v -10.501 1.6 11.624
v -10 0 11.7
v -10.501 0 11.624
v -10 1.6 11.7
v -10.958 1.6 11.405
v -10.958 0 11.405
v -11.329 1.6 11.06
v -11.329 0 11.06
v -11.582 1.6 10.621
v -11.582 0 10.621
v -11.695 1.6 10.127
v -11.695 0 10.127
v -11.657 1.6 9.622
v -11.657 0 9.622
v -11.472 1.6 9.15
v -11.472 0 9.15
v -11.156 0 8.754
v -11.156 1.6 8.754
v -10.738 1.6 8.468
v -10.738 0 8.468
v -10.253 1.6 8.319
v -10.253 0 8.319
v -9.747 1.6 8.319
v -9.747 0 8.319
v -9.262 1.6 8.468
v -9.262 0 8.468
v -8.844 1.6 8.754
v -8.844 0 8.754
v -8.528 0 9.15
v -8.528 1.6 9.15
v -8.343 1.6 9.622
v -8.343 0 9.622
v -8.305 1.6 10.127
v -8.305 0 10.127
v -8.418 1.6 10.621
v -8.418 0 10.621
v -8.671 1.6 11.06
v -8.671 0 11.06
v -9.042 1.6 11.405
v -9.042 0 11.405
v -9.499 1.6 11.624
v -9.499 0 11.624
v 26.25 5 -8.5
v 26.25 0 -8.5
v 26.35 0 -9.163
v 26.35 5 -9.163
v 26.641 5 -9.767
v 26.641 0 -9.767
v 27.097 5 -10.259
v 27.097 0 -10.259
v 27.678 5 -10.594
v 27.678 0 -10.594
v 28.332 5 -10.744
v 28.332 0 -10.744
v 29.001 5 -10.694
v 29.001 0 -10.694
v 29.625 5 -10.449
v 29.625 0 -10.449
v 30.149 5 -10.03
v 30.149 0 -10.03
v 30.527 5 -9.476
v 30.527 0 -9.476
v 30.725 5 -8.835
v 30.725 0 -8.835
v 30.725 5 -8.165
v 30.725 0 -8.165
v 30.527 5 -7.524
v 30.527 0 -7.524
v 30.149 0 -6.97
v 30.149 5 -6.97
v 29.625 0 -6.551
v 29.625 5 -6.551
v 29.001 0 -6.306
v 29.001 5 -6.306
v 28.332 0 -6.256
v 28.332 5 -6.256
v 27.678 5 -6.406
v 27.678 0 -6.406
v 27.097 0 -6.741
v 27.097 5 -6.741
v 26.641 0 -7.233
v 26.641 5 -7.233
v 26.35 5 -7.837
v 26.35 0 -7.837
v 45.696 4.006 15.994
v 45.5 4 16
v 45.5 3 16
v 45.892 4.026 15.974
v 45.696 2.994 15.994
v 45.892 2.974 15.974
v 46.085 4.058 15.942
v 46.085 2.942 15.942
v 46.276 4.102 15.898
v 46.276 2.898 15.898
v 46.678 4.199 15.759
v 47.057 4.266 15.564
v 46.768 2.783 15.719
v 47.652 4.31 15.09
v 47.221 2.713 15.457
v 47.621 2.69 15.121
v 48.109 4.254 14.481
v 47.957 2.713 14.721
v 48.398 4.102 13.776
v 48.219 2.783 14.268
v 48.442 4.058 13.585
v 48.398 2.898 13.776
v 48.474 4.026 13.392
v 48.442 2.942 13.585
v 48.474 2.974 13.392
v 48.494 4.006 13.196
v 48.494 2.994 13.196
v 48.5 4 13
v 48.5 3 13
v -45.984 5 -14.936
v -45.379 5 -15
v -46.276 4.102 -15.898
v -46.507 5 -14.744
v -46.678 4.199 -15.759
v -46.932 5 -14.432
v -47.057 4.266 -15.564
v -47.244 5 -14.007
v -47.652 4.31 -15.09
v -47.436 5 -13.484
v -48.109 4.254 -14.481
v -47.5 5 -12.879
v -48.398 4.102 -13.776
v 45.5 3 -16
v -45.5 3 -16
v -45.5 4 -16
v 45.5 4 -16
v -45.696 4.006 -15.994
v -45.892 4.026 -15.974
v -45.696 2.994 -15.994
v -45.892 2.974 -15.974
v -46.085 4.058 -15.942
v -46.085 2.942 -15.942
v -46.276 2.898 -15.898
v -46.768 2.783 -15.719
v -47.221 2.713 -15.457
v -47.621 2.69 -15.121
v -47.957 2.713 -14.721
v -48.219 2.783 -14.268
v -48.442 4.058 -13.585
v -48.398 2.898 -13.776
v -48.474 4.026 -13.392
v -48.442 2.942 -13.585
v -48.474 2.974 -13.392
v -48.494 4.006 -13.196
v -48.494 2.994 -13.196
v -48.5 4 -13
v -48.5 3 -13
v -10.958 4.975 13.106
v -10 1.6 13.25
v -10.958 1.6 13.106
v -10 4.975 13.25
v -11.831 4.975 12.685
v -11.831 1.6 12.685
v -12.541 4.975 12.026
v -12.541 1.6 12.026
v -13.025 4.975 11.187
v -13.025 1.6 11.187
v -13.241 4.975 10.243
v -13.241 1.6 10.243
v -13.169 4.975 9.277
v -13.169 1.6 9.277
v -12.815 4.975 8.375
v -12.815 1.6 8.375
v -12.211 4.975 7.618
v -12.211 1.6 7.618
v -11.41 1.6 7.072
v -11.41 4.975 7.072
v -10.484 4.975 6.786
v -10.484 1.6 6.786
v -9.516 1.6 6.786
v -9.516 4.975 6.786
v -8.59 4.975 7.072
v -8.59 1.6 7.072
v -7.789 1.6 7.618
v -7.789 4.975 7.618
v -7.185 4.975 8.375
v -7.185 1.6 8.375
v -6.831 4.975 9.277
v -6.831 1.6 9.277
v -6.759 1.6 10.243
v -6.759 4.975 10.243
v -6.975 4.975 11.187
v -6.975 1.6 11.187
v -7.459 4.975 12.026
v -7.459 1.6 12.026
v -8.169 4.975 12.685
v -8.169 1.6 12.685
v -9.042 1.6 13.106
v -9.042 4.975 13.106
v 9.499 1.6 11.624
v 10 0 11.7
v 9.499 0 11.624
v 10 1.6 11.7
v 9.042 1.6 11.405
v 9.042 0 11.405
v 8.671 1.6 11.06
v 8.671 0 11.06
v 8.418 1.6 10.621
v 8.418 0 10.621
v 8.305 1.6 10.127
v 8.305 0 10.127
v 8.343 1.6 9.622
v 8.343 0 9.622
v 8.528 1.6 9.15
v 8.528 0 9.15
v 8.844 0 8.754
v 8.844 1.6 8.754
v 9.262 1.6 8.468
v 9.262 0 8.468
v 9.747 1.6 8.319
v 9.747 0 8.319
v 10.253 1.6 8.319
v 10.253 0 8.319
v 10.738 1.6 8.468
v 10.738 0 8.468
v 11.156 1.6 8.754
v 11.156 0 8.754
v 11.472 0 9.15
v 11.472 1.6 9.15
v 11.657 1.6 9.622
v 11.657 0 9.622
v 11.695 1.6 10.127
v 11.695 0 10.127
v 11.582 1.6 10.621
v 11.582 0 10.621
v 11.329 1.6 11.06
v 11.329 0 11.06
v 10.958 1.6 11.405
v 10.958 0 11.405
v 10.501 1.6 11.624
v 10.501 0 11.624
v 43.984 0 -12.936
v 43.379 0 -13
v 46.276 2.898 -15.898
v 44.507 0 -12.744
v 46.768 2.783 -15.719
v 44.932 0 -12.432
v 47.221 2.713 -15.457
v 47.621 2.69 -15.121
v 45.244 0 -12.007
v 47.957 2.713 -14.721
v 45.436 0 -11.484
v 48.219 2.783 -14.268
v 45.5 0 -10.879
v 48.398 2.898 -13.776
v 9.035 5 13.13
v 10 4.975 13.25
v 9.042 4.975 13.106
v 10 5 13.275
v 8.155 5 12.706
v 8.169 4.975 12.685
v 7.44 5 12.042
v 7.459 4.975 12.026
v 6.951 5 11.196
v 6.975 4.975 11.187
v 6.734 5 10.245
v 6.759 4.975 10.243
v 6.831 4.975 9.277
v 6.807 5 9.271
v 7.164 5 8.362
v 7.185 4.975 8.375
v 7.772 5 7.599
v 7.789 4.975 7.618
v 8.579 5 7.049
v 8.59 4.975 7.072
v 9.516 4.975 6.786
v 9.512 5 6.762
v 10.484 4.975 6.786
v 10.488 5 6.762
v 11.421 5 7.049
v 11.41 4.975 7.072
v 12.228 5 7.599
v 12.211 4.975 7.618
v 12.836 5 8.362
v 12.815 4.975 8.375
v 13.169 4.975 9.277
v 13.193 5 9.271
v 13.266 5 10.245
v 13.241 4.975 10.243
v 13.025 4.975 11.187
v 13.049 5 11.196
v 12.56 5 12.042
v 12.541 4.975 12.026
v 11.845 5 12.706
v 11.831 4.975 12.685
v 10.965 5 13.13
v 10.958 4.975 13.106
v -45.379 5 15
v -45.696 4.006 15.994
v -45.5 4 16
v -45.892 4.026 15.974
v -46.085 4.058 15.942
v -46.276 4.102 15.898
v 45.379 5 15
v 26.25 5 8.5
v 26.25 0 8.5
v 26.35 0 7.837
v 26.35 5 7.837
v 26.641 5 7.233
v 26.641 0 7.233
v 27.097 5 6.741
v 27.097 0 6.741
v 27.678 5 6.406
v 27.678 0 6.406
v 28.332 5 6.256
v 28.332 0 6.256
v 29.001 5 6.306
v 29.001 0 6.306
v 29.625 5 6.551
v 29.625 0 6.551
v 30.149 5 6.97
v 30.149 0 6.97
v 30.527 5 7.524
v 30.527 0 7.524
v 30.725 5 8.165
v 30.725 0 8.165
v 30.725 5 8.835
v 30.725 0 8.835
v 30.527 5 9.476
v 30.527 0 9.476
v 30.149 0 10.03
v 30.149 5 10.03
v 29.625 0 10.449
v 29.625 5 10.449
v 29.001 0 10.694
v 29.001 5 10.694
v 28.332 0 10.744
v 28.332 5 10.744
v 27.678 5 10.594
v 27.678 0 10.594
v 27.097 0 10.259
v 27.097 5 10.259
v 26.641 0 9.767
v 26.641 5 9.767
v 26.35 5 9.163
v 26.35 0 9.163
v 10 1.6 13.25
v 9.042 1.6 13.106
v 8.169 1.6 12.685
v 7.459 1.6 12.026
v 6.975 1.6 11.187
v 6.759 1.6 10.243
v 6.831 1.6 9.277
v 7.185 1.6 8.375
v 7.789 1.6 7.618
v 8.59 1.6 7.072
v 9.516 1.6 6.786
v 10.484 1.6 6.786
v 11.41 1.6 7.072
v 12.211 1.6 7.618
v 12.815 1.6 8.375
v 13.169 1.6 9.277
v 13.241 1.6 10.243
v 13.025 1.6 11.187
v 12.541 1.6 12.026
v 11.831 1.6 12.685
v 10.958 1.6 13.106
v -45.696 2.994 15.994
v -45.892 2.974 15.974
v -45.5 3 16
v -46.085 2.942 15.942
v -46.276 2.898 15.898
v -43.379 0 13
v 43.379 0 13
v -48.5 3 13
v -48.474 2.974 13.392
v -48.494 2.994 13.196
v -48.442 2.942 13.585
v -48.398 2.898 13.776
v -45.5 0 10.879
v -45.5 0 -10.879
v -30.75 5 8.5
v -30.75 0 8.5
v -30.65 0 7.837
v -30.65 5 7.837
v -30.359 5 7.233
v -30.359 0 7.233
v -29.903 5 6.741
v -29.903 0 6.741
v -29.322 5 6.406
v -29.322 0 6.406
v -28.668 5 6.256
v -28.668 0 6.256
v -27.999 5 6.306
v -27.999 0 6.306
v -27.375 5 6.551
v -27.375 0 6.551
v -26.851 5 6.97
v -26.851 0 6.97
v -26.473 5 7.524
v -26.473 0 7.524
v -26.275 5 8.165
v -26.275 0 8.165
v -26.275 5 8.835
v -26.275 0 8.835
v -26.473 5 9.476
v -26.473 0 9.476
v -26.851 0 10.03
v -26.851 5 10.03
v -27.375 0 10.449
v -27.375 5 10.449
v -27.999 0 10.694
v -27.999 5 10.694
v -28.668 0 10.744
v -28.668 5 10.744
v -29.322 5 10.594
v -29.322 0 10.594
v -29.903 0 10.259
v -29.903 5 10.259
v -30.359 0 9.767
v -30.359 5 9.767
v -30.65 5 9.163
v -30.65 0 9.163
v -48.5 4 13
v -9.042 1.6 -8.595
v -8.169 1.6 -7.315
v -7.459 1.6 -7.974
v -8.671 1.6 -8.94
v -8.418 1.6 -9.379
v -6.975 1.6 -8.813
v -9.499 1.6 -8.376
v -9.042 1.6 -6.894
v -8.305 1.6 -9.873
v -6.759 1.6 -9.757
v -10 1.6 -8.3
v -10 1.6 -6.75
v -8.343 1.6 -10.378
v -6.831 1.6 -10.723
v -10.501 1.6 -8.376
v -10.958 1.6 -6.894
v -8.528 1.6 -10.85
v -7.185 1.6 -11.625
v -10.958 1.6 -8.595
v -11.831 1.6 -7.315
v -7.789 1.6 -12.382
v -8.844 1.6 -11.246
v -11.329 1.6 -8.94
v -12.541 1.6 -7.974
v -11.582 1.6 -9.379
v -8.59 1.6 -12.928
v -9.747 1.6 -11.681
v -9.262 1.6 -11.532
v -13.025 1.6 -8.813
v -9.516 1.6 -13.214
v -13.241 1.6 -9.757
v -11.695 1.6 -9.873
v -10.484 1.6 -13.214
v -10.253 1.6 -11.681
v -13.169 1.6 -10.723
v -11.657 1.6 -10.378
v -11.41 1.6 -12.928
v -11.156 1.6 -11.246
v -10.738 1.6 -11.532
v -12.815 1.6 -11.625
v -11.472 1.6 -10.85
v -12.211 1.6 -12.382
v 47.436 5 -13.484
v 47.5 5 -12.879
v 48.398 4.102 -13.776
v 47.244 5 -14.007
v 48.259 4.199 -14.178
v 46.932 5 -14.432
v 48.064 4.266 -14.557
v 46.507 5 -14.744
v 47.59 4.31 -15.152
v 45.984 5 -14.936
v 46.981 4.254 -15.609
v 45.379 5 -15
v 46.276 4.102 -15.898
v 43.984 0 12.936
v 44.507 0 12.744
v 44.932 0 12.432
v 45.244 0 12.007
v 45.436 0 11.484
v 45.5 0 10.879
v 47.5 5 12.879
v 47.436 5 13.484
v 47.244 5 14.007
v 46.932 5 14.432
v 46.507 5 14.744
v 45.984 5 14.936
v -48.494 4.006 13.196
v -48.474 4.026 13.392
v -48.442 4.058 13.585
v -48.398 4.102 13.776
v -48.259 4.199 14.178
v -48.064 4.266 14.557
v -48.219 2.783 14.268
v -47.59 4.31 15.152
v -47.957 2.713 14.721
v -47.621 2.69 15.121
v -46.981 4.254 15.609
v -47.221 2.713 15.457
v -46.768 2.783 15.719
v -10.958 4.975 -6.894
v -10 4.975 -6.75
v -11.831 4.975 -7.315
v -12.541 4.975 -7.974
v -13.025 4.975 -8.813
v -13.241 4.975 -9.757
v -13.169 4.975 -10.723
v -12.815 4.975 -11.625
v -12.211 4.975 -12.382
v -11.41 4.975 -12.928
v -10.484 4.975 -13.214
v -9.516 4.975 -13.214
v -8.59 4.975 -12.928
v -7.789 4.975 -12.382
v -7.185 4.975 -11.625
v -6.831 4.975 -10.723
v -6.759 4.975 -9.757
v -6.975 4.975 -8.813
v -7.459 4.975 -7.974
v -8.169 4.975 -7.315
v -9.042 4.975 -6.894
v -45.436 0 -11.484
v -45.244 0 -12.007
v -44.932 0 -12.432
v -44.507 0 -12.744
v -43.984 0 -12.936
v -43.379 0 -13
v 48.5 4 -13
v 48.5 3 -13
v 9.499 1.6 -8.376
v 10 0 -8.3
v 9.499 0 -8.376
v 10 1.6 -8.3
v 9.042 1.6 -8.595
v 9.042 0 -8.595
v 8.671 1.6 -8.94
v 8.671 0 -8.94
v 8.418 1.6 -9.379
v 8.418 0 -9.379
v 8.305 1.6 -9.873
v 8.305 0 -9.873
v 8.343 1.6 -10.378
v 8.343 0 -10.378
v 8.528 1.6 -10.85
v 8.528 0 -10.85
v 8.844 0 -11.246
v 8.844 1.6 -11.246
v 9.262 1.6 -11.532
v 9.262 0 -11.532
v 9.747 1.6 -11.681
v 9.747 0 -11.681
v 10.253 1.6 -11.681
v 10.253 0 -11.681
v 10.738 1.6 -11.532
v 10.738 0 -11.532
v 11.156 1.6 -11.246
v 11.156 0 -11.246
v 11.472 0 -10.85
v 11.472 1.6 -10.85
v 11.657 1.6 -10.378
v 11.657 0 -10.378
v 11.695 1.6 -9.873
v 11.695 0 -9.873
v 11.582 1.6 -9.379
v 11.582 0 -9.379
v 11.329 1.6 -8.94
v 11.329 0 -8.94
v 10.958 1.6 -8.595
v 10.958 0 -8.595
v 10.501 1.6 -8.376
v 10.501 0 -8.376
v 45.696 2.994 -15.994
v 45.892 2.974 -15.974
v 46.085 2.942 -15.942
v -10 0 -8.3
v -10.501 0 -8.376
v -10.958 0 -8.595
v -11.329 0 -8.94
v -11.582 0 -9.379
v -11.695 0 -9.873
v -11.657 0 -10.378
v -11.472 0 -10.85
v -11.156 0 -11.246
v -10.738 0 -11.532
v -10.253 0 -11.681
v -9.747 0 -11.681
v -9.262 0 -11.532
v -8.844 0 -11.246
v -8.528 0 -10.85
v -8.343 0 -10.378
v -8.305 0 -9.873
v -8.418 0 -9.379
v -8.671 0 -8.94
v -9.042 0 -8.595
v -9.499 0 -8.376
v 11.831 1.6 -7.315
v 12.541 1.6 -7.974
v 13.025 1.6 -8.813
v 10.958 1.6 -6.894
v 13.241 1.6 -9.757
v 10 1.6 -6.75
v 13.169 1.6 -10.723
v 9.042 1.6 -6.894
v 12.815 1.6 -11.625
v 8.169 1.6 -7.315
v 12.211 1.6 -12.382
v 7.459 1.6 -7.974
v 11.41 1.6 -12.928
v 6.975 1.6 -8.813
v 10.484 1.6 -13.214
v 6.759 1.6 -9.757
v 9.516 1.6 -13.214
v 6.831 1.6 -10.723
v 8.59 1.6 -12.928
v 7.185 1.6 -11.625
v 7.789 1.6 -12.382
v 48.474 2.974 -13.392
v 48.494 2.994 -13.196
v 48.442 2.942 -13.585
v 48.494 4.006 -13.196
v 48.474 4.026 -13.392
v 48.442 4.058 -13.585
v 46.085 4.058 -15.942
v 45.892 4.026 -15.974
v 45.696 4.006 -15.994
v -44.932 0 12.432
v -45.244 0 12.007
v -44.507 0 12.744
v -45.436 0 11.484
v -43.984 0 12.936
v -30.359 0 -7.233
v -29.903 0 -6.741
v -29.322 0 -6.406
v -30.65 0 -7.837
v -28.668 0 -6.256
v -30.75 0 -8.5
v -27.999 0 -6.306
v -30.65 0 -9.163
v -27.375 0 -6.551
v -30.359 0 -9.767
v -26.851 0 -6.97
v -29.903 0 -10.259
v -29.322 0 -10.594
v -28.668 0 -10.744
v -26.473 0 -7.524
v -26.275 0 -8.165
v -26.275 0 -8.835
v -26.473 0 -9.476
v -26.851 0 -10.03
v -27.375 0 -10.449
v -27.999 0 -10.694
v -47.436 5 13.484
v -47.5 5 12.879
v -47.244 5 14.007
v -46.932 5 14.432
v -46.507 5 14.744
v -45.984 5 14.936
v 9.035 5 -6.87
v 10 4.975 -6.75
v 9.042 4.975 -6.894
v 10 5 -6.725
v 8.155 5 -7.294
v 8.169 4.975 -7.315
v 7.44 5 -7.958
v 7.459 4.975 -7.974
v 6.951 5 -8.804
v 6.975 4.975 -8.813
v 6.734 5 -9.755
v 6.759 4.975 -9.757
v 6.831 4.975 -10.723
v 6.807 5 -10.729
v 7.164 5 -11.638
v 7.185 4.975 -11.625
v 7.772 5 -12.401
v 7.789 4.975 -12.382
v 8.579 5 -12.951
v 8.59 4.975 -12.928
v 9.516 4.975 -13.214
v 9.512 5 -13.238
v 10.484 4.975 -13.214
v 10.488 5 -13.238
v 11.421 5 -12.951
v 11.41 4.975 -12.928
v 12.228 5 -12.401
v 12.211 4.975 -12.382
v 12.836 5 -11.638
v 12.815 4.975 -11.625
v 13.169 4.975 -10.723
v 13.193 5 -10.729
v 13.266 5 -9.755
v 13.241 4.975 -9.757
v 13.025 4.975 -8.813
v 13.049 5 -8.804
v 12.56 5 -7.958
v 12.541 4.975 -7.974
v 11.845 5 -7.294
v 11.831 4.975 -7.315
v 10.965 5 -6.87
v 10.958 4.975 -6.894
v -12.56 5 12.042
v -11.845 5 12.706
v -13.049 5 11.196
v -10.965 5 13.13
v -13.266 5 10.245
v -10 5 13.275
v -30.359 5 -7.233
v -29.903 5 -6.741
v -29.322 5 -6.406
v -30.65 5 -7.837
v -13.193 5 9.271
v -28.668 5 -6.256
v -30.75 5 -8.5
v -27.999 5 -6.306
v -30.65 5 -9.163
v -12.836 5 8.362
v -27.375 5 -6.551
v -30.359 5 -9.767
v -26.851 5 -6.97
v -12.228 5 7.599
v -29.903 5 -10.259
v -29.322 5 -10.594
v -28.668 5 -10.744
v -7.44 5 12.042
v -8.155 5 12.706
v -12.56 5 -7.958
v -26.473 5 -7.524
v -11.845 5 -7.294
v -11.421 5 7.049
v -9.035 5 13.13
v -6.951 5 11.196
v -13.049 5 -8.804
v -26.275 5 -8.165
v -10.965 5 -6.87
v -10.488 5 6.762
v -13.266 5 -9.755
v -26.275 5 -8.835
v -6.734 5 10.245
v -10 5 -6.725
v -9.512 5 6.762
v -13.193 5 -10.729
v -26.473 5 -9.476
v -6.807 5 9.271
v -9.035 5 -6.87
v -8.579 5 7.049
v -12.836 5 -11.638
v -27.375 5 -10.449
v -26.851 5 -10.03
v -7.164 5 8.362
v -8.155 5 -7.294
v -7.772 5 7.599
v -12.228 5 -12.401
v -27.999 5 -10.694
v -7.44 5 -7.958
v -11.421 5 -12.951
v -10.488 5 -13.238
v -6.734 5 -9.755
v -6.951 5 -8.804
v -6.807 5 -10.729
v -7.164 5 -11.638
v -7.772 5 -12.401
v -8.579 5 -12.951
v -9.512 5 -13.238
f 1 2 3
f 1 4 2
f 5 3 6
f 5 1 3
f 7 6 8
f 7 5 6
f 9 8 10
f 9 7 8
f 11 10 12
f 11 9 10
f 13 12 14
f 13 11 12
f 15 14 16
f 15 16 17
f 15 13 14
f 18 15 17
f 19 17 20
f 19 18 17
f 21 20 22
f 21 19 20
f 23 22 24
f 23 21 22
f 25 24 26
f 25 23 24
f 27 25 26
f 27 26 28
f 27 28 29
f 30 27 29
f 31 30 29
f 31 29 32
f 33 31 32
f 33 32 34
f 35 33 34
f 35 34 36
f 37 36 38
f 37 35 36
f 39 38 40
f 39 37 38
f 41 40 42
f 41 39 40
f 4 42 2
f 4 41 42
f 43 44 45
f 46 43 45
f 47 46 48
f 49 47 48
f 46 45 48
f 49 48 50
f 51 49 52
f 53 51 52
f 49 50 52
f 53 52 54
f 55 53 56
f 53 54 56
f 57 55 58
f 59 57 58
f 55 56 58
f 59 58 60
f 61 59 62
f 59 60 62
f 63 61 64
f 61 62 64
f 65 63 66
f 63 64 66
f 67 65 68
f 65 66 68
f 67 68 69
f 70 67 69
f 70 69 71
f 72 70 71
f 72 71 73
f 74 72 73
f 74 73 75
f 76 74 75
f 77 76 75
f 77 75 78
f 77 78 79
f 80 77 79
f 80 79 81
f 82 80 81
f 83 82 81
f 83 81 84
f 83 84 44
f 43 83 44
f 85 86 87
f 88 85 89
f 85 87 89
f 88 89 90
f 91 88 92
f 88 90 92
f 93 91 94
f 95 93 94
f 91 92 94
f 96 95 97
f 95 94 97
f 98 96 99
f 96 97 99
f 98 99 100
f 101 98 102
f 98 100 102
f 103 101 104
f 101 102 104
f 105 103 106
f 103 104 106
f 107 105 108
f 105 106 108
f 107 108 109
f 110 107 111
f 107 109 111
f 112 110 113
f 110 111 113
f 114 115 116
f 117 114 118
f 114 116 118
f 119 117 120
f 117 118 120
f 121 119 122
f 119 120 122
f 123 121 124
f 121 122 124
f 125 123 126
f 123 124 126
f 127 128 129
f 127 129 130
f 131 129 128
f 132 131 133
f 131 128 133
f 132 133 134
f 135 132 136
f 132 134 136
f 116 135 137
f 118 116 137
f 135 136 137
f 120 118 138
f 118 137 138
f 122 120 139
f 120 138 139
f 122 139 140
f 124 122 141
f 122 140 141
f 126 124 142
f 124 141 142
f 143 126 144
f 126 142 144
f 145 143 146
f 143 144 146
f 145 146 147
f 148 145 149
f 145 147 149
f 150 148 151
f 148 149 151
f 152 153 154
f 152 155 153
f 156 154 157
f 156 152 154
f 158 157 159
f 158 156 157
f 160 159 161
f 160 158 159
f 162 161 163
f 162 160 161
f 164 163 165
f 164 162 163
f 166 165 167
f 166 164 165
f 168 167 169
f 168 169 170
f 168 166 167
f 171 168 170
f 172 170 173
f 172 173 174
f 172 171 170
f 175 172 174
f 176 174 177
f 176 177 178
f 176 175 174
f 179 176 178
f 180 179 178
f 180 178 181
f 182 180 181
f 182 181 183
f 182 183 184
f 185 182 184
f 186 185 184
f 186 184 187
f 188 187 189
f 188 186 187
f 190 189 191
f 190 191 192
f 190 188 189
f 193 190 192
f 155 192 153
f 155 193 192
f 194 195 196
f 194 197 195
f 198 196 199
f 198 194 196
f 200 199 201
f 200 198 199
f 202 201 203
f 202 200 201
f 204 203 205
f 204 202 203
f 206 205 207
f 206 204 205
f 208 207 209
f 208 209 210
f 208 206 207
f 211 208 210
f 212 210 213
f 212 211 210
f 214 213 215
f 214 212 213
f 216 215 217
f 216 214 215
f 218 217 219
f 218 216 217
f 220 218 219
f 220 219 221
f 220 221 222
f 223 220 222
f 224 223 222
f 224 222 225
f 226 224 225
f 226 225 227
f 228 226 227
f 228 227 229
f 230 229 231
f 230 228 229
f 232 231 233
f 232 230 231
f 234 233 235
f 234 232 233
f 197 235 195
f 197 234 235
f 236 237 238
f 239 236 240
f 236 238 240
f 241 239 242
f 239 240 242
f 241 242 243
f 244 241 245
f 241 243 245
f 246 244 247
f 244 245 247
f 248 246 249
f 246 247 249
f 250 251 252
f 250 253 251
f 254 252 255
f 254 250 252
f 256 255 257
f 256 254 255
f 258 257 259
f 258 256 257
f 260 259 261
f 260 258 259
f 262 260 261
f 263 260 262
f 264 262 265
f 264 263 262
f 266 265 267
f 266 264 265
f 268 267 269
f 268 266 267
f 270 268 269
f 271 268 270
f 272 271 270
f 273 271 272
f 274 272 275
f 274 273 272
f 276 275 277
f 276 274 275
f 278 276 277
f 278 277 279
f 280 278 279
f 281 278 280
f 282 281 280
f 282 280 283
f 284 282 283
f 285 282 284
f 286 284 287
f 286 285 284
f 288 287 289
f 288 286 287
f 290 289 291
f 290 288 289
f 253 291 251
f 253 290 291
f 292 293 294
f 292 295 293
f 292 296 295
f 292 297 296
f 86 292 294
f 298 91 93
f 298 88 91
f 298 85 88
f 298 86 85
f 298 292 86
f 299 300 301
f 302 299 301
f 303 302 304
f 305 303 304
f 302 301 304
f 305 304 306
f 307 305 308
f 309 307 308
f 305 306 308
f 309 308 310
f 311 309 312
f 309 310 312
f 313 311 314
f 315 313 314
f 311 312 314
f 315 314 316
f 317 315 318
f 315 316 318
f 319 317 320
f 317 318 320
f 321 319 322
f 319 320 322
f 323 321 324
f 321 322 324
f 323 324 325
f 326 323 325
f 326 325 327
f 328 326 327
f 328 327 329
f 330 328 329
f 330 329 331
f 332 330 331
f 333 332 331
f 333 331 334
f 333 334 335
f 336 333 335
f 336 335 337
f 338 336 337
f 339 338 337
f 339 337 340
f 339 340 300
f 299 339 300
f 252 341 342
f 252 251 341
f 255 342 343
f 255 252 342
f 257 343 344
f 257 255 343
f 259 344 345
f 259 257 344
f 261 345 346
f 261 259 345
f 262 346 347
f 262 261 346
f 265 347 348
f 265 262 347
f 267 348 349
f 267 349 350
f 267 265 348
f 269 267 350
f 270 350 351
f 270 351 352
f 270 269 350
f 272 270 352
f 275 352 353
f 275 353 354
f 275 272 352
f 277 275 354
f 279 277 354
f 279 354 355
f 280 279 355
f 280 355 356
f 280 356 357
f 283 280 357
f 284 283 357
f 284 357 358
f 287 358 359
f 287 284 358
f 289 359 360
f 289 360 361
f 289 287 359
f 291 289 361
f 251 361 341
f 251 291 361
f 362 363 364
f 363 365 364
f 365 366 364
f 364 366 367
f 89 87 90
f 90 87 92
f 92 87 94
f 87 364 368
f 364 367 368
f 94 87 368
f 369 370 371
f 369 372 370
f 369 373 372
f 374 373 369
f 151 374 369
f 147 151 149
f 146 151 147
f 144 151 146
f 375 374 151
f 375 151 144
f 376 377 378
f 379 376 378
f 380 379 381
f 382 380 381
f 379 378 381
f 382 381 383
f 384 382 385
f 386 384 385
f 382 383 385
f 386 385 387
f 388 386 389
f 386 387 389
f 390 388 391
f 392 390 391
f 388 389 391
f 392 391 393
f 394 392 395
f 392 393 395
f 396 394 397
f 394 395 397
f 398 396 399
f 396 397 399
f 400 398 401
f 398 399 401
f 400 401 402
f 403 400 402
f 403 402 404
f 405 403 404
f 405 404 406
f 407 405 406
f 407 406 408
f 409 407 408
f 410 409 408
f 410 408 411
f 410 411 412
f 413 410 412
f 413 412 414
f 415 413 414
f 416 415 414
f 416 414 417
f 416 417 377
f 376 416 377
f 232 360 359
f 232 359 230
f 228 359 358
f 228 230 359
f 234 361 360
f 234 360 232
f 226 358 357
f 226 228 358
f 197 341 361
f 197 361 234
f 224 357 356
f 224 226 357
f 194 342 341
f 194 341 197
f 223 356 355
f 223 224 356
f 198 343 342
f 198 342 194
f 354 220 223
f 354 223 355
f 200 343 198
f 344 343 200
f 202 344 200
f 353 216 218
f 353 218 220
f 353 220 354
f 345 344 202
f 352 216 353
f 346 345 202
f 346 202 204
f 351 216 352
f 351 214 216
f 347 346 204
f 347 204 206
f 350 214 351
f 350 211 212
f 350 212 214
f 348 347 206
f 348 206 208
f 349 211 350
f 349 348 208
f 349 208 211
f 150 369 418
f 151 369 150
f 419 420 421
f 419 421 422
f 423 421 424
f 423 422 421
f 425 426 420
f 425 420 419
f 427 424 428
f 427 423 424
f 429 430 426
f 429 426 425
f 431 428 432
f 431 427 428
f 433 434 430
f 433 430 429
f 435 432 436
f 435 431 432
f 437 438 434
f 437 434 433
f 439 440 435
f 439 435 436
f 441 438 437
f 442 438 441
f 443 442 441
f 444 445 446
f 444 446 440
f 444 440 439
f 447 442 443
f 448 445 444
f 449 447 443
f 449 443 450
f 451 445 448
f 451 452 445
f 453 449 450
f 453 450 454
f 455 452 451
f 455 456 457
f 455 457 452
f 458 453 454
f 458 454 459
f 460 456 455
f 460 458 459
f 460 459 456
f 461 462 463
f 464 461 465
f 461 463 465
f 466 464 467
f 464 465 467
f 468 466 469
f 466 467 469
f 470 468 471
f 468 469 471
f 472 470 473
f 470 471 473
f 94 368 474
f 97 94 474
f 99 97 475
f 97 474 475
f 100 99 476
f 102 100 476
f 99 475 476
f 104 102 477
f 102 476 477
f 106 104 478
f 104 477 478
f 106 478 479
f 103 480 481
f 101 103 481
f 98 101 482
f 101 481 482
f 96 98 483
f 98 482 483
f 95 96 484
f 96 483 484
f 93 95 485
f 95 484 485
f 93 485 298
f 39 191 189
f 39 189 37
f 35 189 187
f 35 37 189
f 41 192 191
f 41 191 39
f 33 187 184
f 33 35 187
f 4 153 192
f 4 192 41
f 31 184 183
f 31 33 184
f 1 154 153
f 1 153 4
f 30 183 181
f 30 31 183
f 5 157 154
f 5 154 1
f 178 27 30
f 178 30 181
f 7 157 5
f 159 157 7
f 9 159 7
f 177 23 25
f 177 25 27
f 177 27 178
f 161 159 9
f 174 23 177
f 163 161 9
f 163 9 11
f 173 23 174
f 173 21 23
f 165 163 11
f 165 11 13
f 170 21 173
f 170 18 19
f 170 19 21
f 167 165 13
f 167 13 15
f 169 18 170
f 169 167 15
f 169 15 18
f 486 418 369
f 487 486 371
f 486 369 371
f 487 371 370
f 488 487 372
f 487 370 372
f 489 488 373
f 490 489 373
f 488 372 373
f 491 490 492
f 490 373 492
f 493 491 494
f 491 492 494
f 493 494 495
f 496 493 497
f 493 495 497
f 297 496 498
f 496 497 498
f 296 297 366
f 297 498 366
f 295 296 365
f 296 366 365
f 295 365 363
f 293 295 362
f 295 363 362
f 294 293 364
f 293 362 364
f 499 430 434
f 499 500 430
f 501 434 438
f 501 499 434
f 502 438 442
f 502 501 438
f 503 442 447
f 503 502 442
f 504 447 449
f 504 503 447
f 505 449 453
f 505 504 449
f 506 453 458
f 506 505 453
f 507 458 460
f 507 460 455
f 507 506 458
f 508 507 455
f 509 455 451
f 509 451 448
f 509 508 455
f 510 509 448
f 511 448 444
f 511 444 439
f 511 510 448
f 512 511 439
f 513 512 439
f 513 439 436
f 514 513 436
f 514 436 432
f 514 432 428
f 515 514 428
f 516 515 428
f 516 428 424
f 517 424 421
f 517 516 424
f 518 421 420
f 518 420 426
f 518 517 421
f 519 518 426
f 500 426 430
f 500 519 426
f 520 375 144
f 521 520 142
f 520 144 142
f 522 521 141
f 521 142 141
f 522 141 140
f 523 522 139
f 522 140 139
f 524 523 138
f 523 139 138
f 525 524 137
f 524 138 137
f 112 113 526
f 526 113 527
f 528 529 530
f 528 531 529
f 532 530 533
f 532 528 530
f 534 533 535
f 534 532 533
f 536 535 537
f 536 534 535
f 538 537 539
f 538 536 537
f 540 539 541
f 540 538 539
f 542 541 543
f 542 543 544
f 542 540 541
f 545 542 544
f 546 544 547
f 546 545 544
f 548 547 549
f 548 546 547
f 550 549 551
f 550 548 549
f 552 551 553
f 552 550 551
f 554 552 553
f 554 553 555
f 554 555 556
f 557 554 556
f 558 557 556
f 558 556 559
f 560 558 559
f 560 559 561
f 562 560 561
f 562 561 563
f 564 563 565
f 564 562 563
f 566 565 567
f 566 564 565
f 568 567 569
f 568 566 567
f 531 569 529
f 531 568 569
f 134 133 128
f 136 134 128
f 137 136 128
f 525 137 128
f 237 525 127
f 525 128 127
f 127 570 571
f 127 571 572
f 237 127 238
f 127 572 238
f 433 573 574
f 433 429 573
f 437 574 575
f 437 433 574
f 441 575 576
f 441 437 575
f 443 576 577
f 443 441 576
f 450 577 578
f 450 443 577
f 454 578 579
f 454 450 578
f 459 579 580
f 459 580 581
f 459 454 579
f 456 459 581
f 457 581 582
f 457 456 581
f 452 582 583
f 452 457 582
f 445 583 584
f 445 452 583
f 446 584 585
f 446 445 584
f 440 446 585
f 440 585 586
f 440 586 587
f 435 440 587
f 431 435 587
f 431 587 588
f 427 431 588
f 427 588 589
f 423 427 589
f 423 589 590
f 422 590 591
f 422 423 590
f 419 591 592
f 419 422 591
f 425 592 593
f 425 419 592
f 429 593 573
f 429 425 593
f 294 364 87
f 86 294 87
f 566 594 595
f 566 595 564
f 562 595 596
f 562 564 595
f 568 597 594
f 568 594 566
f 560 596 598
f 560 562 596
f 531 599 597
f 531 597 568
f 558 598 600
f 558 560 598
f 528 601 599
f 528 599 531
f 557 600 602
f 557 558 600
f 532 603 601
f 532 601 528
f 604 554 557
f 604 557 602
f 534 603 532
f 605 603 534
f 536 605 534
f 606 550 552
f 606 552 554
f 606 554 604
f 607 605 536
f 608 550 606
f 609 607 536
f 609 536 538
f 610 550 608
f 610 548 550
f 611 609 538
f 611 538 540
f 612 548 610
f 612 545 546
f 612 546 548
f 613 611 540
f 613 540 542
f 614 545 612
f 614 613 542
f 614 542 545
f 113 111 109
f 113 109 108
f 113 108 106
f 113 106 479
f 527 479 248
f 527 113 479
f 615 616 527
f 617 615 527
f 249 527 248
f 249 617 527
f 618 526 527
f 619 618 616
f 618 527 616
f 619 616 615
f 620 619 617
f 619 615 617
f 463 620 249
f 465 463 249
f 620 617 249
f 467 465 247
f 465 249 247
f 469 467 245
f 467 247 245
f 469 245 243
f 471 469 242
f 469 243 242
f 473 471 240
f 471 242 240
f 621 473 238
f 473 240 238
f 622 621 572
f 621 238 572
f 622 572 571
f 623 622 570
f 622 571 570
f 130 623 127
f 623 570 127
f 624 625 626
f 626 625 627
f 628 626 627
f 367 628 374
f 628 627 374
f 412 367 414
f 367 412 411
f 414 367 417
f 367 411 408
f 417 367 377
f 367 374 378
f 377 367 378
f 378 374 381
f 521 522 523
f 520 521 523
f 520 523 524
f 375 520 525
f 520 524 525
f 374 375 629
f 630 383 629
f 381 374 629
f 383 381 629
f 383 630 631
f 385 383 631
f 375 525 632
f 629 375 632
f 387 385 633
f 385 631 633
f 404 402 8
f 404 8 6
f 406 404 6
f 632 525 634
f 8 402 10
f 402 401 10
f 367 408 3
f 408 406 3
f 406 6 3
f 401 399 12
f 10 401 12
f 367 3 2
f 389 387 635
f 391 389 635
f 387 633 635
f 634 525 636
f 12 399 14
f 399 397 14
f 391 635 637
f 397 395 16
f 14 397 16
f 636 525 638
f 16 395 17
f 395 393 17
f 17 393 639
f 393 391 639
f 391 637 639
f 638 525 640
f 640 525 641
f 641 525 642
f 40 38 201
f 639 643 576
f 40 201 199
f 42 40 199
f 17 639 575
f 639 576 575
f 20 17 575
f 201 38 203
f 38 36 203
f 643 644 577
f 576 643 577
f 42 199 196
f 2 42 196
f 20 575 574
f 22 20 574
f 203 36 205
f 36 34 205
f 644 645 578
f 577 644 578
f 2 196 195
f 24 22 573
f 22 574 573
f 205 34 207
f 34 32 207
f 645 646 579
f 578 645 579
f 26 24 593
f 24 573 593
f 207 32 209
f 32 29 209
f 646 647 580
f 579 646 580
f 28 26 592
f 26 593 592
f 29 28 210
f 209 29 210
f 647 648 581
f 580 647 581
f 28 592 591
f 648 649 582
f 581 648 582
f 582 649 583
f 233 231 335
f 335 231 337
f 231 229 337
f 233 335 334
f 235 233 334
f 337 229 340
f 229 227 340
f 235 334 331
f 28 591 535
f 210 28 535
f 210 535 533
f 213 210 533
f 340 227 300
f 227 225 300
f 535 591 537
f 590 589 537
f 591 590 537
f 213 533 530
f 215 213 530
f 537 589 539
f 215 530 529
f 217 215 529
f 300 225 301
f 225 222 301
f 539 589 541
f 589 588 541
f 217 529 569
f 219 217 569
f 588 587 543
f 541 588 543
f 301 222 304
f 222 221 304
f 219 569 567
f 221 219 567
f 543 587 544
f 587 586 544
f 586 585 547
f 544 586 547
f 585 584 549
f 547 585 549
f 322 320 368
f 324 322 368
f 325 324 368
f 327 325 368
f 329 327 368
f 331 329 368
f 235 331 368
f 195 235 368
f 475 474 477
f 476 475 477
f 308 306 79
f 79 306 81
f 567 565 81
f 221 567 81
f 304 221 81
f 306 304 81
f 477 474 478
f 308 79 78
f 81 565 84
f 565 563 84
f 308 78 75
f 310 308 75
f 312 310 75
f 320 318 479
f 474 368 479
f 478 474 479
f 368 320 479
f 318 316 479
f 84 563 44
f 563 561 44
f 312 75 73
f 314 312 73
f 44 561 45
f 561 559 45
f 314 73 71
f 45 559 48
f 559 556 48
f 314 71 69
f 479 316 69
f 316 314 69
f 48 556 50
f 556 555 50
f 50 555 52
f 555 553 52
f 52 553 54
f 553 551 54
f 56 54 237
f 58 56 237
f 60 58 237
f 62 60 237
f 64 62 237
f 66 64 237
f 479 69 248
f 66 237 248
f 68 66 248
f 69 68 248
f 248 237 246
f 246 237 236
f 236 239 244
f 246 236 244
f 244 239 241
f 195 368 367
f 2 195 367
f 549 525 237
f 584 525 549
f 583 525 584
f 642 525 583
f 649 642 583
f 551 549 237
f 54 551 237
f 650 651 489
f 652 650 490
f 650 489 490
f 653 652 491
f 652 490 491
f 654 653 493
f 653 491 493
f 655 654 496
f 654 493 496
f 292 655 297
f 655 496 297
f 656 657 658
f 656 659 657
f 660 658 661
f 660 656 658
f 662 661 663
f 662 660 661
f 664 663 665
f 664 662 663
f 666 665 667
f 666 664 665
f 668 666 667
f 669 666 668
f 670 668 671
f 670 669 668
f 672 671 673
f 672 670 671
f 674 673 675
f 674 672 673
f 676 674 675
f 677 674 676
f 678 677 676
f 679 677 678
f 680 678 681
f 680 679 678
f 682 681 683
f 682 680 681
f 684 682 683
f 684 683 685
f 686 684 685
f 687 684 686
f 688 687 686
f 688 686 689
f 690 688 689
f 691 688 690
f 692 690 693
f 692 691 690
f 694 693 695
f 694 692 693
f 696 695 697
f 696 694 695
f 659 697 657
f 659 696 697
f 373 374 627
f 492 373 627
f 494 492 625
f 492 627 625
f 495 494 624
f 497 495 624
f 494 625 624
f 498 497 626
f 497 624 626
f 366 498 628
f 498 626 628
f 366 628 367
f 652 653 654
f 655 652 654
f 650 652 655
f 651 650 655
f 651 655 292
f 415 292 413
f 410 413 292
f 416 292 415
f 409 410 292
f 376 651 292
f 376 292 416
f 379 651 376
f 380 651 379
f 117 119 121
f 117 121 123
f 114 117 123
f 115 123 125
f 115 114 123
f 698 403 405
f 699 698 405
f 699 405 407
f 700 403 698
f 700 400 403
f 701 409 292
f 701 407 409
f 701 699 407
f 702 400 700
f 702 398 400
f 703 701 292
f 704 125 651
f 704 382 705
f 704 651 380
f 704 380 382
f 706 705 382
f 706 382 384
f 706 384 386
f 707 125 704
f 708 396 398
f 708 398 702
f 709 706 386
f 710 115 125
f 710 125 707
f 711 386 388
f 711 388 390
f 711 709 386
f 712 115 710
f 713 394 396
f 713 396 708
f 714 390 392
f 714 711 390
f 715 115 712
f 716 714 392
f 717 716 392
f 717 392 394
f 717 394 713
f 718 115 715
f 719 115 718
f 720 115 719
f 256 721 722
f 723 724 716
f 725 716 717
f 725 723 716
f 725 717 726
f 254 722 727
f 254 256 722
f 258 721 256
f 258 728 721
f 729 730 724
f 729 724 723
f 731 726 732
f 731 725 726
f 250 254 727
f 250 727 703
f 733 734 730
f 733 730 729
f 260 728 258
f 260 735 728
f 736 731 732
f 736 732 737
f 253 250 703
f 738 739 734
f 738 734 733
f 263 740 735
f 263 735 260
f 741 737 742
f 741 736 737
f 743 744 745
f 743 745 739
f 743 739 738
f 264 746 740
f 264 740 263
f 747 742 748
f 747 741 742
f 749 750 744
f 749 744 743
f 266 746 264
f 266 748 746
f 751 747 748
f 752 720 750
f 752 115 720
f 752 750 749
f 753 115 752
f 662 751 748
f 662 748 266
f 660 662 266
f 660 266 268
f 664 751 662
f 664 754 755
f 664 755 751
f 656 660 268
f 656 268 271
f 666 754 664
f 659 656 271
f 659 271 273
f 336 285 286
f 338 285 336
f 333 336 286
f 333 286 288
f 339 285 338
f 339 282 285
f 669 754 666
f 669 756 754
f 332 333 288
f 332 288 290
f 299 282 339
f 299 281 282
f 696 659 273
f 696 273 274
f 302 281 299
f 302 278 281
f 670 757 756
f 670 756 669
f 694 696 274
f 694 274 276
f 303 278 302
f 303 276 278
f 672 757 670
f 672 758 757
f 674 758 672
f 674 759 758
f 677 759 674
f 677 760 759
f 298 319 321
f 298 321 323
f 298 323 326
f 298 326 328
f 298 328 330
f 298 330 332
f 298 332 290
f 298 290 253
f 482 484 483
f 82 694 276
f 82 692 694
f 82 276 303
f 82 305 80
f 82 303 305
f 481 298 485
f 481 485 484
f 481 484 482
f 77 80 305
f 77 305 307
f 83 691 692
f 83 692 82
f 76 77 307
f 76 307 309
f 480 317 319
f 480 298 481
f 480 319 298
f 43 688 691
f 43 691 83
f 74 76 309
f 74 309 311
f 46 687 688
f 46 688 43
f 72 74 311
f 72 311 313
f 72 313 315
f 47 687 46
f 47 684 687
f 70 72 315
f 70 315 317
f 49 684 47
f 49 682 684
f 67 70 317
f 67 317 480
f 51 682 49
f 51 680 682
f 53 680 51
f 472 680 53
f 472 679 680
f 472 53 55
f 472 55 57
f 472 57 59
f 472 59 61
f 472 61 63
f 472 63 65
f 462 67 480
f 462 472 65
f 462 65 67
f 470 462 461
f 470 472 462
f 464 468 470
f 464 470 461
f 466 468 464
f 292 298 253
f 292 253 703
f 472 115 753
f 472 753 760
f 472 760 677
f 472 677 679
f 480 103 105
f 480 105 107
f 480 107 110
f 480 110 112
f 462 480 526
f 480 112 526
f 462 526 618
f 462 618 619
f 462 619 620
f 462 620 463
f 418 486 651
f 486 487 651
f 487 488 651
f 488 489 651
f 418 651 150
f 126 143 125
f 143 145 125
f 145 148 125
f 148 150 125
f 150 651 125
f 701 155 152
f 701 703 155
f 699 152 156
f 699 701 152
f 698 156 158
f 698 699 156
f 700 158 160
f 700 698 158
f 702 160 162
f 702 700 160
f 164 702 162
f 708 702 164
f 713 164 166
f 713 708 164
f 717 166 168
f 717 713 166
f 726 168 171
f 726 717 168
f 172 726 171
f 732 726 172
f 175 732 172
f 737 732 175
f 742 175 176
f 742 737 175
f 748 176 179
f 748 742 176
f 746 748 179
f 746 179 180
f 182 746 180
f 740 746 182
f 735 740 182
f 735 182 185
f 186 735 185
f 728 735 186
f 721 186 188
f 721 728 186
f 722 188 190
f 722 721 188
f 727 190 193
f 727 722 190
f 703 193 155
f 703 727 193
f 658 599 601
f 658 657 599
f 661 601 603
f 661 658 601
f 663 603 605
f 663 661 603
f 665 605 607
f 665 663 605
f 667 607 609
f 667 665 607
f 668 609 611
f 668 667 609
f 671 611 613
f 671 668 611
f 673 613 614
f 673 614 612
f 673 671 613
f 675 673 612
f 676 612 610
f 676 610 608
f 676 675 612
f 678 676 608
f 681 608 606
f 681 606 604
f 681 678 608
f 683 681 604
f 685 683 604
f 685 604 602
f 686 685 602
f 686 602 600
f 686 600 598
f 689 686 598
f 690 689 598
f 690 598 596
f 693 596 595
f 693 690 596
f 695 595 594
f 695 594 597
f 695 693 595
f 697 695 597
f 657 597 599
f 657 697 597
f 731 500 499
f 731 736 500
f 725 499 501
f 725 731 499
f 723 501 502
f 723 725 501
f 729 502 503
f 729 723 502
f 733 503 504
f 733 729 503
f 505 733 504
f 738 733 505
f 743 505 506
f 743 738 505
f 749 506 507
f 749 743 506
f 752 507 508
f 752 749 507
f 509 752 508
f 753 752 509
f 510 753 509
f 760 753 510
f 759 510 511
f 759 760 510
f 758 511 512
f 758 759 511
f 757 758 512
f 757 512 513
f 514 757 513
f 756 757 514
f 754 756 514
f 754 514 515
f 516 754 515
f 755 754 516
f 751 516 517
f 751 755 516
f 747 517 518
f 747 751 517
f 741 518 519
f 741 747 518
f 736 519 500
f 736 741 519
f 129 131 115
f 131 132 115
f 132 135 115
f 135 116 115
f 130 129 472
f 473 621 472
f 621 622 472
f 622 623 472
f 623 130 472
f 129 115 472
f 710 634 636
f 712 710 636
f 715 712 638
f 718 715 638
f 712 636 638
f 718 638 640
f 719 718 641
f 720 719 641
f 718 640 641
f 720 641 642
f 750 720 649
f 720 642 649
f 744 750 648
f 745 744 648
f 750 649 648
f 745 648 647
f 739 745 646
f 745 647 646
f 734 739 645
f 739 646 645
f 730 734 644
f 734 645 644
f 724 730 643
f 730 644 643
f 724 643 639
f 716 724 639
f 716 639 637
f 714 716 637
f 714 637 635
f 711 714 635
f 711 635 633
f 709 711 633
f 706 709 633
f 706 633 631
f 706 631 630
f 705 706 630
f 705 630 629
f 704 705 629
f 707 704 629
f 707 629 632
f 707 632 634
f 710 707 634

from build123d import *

# Parameters (mm, degrees)
SKETCH1_W                                    = 97
SKETCH1_H                                    = 32
BOSS_EXTRUDE1_DEPTH                          = 5
HOLE1_D                                      = 4.5
HOLE1_DEPTH                                  = 6
CHAMFER1_SIZE                                = 1
CHAMFER2_SIZE                                = 3
FILLET1_R                                    = 3
CBORE_FOR_M3_HEX_SOCKET_HEAD_CAP_SCR_2_COUNT = 2
CBORE_FOR_M3_HEX_SOCKET_HEAD_CAP_SCR_2_PITCH = 20
CBORE_FOR_M3_HEX_SOCKET_HEAD_CAP_SCR_3_COUNT = 2
CBORE_FOR_M3_HEX_SOCKET_HEAD_CAP_SCR_3_PITCH = 20
CBORE_FOR_M3_HEX_SOCKET_HEAD_CAP_SCR_4_COUNT = 2
CBORE_FOR_M3_HEX_SOCKET_HEAD_CAP_SCR_4_PITCH = 28.284271247


with BuildPart() as part:
    # Sketch1 → Boss-Extrude1 (new body)
    with BuildSketch(Plane(origin=(0, 0, 0), x_dir=(1, 0, 0), z_dir=(0, 1, 0))):
        Rectangle(SKETCH1_W, SKETCH1_H)
    extrude(amount=BOSS_EXTRUDE1_DEPTH)

    # Hole1
    with Locations(Plane(origin=(0, 5, 0), x_dir=(1, 0, 0), z_dir=(0, 1, 0))):
        with Locations((-28.5, 8.5), (-28.5, -8.5), (28.5, -8.5), (28.5, 8.5)):
            Hole(HOLE1_D / 2, depth=HOLE1_DEPTH)

    # Chamfer1
    chamfer1_edges = [part.edges().sort_by_distance(p)[0] for p in [
        (-48.5, 5, 0),
        (0, 5, 16),
        (48.5, 5, 0),
        (0, 5, -16),
    ]]
    chamfer(chamfer1_edges, length=CHAMFER1_SIZE)

    # Chamfer2
    chamfer2_edges = [part.edges().sort_by_distance(p)[0] for p in [
        (0, 0, 16),
        (-48.5, 0, 0),
        (0, 0, -16),
        (48.5, 0, 0),
    ]]
    chamfer(chamfer2_edges, length=CHAMFER2_SIZE)

    # Fillet1
    # the kernel refuses this fillet: 3 mm, written as the material it takes off along each edge
    with BuildSketch(Plane(origin=(48.5, -4.5, 16), x_dir=(0, 0, -1), z_dir=(0, 1, 0)), Plane(origin=(48.5, -4.5, -16), x_dir=(-1, 0, 0), z_dir=(0, 1, 0))) as fillet1_piece_1:
        with BuildLine():
            CenterArc((FILLET1_R, FILLET1_R), FILLET1_R, 180, 90)
            Line((0, FILLET1_R), (0, 0))
            Line((0, 0), (FILLET1_R, 0))
        make_face()
    extrude(amount=16, mode=Mode.SUBTRACT)
    with BuildSketch(Plane(origin=(-48.5, -4.5, 16), x_dir=(0, 0, -1), z_dir=(0, 1, 0)), Plane(origin=(-48.5, -4.5, -16), x_dir=(1, 0, 0), z_dir=(0, 1, 0))) as fillet1_piece_2:
        with BuildLine():
            CenterArc((FILLET1_R, -FILLET1_R), FILLET1_R, 90, 90)
            Line((0, -FILLET1_R), (0, 0))
            Line((0, 0), (FILLET1_R, 0))
        make_face()
    extrude(amount=16, mode=Mode.SUBTRACT)
    with BuildSketch(Plane(origin=(-51, 1.5, -18.5), x_dir=(0.8164965809277261, -0.40824829046386363, -0.40824829046386235), z_dir=(0.5773502691896258, 0.5773502691896258, 0.5773502691896258)), Plane(origin=(-51, 1.5, 18.5), x_dir=(-0.4082482904638625, -0.4082482904638635, -0.8164965809277259), z_dir=(0.5773502691896258, 0.5773502691896258, -0.5773502691896258)), Plane(origin=(45, 7.5, 12.5), x_dir=(0.40824829046386274, -0.40824829046386324, -0.816496580927726), z_dir=(0.5773502691896258, -0.5773502691896258, 0.5773502691896258))) as fillet1_piece_3:
        with BuildLine():
            CenterArc((FILLET1_R * 0.57735026919, -FILLET1_R), FILLET1_R, 90, 60)
            Line((-FILLET1_R * 0.288675134595, -FILLET1_R * 0.5), (0, 0))
            Line((0, 0), (FILLET1_R * 0.57735026919, 0))
        make_face()
    extrude(amount=10.392304845, mode=Mode.SUBTRACT)
    with BuildSketch(Plane(origin=(51, 1.5, -18.5), x_dir=(-0.816496580927726, -0.4082482904638631, -0.40824829046386285), z_dir=(-0.5773502691896258, 0.5773502691896258, 0.5773502691896258))) as fillet1_piece_4:
        with BuildLine():
            CenterArc((FILLET1_R * 0.57735026919, FILLET1_R), FILLET1_R, 210, 60)
            Line((-FILLET1_R * 0.288675134595, FILLET1_R * 0.5), (0, 0))
            Line((0, 0), (FILLET1_R * 0.57735026919, 0))
        make_face()
    extrude(amount=10.392304845, mode=Mode.SUBTRACT)
    with BuildSketch(Plane(origin=(-43, -2.5, 10.5), x_dir=(-0.4082482904638623, 0.4082482904638638, -0.816496580927726), z_dir=(-0.5773502691896258, 0.5773502691896258, 0.5773502691896258)), Plane(origin=(51, 5.5, -18.5), x_dir=(-0.816496580927726, 0.40824829046386324, -0.40824829046386274), z_dir=(-0.5773502691896258, -0.5773502691896258, 0.5773502691896258))) as fillet1_piece_5:
        with BuildLine():
            CenterArc((FILLET1_R * 0.57735026919, -FILLET1_R), FILLET1_R, 90, 60)
            Line((-FILLET1_R * 0.288675134595, -FILLET1_R * 0.5), (0, 0))
            Line((0, 0), (FILLET1_R * 0.57735026919, 0))
        make_face()
    extrude(amount=13.856406461, mode=Mode.SUBTRACT)
    with BuildSketch(Plane(origin=(-51, 5.5, -18.5), x_dir=(0.816496580927726, 0.4082482904638625, -0.4082482904638635), z_dir=(0.5773502691896258, -0.5773502691896258, 0.5773502691896258)), Plane(origin=(43, -2.5, 10.5), x_dir=(0.40824829046386285, 0.40824829046386313, -0.816496580927726), z_dir=(0.5773502691896258, 0.5773502691896258, 0.5773502691896258))) as fillet1_piece_6:
        with BuildLine():
            CenterArc((FILLET1_R * 0.57735026919, FILLET1_R), FILLET1_R, 210, 60)
            Line((-FILLET1_R * 0.288675134595, FILLET1_R * 0.5), (0, 0))
            Line((0, 0), (FILLET1_R * 0.57735026919, 0))
        make_face()
    extrude(amount=13.856406461, mode=Mode.SUBTRACT)

    # Sketch7 → CBORE for M3 Hex Socket Head Cap Screw1 (revolve, cut)
    with BuildSketch(Plane(origin=(10, 5, -10), x_dir=(0, 0, 1), z_dir=(1, 0, 0))):
        Polygon((0, 0), (0, 5), (1.7, 5), (1.7, 3.4), (3.25, 3.4), (3.25, 0.025), (3.275, 0), align=None)
    cbore_for_m3_hex_socket_head_cap_screw1 = revolve(axis=Axis((10, 11.35, -10), (0, -1, 0)), mode=Mode.SUBTRACT)

    # CBORE for M3 Hex Socket Head Cap Scr 2: CBORE for M3 Hex Socket Head Cap Screw1 ×2
    with Locations(*[(-i * CBORE_FOR_M3_HEX_SOCKET_HEAD_CAP_SCR_2_PITCH, 0, 0) for i in range(1, CBORE_FOR_M3_HEX_SOCKET_HEAD_CAP_SCR_2_COUNT)]):
        add(cbore_for_m3_hex_socket_head_cap_screw1, mode=Mode.SUBTRACT)

    # CBORE for M3 Hex Socket Head Cap Scr 3: CBORE for M3 Hex Socket Head Cap Screw1 ×2
    with Locations(*[(0, 0, i * CBORE_FOR_M3_HEX_SOCKET_HEAD_CAP_SCR_3_PITCH) for i in range(1, CBORE_FOR_M3_HEX_SOCKET_HEAD_CAP_SCR_3_COUNT)]):
        add(cbore_for_m3_hex_socket_head_cap_screw1, mode=Mode.SUBTRACT)

    # CBORE for M3 Hex Socket Head Cap Scr 4: CBORE for M3 Hex Socket Head Cap Screw1 ×2
    with Locations(*[Vector(-0.7071067811865475, 0, 0.7071067811865477) * (i * CBORE_FOR_M3_HEX_SOCKET_HEAD_CAP_SCR_4_PITCH) for i in range(1, CBORE_FOR_M3_HEX_SOCKET_HEAD_CAP_SCR_4_COUNT)]):
        add(cbore_for_m3_hex_socket_head_cap_screw1, mode=Mode.SUBTRACT)


solid = part.part
